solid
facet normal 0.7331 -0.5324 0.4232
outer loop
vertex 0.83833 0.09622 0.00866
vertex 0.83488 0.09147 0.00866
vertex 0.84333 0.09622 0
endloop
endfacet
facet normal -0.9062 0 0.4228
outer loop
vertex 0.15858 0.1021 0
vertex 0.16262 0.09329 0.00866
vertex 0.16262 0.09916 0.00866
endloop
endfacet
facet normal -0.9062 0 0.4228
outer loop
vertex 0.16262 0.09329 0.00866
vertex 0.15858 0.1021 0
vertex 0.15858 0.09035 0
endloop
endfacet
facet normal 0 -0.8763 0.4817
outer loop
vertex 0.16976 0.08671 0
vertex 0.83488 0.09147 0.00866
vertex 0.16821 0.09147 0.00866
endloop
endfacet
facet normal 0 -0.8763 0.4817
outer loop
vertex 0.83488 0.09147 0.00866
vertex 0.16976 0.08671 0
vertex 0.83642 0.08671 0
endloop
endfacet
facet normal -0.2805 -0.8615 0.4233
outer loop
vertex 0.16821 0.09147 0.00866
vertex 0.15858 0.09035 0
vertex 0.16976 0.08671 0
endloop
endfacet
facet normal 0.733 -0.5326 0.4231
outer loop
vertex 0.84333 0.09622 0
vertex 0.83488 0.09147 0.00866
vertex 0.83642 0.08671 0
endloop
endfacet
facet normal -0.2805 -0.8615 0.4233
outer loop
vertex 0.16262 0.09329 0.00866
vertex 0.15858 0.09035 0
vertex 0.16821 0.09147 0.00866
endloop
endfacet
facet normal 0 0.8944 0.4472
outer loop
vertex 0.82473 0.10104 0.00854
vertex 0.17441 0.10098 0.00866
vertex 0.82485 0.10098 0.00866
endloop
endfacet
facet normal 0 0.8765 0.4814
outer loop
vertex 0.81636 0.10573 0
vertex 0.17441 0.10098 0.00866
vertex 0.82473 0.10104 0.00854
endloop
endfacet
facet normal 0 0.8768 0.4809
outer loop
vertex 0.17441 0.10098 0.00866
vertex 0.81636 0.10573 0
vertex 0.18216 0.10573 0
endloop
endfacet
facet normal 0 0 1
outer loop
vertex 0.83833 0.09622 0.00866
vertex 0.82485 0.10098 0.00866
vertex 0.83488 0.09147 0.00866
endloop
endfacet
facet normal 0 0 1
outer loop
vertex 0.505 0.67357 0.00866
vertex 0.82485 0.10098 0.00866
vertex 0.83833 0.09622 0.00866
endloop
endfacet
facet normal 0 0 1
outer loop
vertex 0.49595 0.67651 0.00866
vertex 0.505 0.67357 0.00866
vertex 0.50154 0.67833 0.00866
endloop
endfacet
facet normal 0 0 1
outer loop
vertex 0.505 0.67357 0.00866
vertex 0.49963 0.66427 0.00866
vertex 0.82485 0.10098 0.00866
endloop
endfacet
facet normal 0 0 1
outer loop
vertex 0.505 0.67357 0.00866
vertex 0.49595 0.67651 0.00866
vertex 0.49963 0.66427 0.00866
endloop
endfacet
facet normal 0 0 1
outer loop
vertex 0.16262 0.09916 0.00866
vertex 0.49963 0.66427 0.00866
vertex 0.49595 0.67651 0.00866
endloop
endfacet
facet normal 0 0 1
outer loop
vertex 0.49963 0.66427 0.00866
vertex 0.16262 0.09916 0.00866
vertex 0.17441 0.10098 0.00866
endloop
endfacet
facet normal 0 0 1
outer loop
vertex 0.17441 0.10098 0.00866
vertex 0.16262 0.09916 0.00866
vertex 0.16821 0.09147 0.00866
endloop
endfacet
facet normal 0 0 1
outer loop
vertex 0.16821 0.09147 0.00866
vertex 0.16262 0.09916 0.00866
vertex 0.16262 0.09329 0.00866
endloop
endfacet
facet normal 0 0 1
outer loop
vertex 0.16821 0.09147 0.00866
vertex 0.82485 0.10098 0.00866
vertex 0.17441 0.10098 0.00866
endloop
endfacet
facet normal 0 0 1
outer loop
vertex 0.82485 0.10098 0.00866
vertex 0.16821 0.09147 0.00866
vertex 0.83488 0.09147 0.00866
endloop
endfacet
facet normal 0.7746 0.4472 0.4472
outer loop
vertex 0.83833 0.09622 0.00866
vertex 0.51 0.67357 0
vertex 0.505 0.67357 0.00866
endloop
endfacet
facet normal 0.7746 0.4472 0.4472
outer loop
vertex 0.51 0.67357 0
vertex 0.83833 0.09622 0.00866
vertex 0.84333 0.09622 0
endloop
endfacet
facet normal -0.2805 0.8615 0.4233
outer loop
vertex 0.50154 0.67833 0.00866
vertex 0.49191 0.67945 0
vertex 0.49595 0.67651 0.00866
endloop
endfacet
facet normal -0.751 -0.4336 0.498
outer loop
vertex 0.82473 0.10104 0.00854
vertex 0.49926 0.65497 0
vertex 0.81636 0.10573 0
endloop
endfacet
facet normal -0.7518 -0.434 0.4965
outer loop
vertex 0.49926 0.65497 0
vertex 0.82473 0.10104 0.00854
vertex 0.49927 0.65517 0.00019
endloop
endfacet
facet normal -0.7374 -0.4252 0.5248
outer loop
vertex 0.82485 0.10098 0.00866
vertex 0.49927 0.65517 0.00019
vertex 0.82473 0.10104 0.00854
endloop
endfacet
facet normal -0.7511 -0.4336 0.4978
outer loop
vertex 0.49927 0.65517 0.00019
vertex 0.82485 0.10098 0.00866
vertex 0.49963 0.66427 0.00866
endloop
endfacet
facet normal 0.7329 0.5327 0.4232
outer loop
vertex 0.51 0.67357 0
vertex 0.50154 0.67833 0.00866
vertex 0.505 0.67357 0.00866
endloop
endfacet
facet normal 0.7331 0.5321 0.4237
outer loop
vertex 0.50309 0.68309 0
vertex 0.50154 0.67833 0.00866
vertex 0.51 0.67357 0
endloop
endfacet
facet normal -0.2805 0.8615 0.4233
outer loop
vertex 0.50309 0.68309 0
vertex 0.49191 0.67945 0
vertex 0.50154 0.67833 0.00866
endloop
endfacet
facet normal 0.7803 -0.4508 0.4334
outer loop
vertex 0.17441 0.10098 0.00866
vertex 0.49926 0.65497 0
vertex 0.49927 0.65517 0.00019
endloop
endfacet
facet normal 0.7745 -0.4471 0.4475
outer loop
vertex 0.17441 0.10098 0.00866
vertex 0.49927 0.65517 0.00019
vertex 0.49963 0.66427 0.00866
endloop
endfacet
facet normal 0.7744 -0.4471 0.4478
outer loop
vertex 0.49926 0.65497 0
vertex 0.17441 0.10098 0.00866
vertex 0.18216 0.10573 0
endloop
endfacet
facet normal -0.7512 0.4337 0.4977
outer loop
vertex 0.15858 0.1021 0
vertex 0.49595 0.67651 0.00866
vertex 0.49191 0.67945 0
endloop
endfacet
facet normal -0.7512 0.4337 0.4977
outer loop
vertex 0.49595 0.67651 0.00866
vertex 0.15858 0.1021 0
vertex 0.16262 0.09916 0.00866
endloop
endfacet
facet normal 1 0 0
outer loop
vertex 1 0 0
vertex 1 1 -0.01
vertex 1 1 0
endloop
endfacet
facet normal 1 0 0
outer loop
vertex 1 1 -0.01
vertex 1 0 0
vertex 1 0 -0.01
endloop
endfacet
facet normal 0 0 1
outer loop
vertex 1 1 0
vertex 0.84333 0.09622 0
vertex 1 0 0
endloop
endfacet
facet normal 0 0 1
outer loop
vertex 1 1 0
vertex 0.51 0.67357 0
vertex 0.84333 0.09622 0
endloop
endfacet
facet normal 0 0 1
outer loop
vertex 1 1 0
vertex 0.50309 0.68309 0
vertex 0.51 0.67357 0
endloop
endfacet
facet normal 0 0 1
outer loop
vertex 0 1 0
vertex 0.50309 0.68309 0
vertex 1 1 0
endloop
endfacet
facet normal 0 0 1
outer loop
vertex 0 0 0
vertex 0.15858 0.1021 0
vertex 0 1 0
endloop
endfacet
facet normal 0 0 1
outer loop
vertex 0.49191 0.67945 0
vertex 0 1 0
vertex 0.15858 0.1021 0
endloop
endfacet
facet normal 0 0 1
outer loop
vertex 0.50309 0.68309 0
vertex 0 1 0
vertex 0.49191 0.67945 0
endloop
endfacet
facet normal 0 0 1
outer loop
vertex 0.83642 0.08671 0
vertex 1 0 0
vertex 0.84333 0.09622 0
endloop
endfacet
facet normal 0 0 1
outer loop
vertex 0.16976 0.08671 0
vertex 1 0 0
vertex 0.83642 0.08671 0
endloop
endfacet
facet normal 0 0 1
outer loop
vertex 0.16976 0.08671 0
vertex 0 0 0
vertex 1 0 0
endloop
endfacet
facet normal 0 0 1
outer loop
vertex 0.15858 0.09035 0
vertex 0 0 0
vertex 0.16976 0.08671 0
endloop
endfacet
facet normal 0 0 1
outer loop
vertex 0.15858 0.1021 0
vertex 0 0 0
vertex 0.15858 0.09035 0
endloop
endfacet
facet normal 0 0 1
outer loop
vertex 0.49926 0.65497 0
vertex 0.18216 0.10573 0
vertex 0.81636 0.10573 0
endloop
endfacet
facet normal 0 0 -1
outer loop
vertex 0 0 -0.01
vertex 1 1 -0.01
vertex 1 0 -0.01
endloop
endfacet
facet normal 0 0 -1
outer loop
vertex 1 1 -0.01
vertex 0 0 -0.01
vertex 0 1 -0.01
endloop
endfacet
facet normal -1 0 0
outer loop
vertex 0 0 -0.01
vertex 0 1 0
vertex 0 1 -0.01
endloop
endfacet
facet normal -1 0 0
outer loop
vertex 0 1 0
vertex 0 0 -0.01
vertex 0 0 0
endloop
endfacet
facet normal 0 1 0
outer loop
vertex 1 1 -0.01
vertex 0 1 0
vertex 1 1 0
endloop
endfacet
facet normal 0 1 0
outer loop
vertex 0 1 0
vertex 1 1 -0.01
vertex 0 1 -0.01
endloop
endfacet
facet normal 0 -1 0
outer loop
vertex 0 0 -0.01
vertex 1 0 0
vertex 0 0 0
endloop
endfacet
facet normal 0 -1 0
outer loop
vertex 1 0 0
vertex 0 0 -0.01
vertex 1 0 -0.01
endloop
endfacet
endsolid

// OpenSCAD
hull(){
    translate([0.1666666667, 0.0962250449]) sphere(0.01);
    translate([0.8333333333, 0.0962250449]) sphere(0.01);
}
hull(){
    translate([0.8333333333, 0.0962250449]) sphere(0.01);
    translate([0.5, 0.6735753143]) sphere(0.01);
}
hull(){
    translate([0.5, 0.6735753143]) sphere(0.01);
    translate([0.1666666667, 0.0962250449]) sphere(0.01);
}
translate([0,0,-0.01]) color([0.1,0.1,0.1]) cube([1,1,0.01]);
